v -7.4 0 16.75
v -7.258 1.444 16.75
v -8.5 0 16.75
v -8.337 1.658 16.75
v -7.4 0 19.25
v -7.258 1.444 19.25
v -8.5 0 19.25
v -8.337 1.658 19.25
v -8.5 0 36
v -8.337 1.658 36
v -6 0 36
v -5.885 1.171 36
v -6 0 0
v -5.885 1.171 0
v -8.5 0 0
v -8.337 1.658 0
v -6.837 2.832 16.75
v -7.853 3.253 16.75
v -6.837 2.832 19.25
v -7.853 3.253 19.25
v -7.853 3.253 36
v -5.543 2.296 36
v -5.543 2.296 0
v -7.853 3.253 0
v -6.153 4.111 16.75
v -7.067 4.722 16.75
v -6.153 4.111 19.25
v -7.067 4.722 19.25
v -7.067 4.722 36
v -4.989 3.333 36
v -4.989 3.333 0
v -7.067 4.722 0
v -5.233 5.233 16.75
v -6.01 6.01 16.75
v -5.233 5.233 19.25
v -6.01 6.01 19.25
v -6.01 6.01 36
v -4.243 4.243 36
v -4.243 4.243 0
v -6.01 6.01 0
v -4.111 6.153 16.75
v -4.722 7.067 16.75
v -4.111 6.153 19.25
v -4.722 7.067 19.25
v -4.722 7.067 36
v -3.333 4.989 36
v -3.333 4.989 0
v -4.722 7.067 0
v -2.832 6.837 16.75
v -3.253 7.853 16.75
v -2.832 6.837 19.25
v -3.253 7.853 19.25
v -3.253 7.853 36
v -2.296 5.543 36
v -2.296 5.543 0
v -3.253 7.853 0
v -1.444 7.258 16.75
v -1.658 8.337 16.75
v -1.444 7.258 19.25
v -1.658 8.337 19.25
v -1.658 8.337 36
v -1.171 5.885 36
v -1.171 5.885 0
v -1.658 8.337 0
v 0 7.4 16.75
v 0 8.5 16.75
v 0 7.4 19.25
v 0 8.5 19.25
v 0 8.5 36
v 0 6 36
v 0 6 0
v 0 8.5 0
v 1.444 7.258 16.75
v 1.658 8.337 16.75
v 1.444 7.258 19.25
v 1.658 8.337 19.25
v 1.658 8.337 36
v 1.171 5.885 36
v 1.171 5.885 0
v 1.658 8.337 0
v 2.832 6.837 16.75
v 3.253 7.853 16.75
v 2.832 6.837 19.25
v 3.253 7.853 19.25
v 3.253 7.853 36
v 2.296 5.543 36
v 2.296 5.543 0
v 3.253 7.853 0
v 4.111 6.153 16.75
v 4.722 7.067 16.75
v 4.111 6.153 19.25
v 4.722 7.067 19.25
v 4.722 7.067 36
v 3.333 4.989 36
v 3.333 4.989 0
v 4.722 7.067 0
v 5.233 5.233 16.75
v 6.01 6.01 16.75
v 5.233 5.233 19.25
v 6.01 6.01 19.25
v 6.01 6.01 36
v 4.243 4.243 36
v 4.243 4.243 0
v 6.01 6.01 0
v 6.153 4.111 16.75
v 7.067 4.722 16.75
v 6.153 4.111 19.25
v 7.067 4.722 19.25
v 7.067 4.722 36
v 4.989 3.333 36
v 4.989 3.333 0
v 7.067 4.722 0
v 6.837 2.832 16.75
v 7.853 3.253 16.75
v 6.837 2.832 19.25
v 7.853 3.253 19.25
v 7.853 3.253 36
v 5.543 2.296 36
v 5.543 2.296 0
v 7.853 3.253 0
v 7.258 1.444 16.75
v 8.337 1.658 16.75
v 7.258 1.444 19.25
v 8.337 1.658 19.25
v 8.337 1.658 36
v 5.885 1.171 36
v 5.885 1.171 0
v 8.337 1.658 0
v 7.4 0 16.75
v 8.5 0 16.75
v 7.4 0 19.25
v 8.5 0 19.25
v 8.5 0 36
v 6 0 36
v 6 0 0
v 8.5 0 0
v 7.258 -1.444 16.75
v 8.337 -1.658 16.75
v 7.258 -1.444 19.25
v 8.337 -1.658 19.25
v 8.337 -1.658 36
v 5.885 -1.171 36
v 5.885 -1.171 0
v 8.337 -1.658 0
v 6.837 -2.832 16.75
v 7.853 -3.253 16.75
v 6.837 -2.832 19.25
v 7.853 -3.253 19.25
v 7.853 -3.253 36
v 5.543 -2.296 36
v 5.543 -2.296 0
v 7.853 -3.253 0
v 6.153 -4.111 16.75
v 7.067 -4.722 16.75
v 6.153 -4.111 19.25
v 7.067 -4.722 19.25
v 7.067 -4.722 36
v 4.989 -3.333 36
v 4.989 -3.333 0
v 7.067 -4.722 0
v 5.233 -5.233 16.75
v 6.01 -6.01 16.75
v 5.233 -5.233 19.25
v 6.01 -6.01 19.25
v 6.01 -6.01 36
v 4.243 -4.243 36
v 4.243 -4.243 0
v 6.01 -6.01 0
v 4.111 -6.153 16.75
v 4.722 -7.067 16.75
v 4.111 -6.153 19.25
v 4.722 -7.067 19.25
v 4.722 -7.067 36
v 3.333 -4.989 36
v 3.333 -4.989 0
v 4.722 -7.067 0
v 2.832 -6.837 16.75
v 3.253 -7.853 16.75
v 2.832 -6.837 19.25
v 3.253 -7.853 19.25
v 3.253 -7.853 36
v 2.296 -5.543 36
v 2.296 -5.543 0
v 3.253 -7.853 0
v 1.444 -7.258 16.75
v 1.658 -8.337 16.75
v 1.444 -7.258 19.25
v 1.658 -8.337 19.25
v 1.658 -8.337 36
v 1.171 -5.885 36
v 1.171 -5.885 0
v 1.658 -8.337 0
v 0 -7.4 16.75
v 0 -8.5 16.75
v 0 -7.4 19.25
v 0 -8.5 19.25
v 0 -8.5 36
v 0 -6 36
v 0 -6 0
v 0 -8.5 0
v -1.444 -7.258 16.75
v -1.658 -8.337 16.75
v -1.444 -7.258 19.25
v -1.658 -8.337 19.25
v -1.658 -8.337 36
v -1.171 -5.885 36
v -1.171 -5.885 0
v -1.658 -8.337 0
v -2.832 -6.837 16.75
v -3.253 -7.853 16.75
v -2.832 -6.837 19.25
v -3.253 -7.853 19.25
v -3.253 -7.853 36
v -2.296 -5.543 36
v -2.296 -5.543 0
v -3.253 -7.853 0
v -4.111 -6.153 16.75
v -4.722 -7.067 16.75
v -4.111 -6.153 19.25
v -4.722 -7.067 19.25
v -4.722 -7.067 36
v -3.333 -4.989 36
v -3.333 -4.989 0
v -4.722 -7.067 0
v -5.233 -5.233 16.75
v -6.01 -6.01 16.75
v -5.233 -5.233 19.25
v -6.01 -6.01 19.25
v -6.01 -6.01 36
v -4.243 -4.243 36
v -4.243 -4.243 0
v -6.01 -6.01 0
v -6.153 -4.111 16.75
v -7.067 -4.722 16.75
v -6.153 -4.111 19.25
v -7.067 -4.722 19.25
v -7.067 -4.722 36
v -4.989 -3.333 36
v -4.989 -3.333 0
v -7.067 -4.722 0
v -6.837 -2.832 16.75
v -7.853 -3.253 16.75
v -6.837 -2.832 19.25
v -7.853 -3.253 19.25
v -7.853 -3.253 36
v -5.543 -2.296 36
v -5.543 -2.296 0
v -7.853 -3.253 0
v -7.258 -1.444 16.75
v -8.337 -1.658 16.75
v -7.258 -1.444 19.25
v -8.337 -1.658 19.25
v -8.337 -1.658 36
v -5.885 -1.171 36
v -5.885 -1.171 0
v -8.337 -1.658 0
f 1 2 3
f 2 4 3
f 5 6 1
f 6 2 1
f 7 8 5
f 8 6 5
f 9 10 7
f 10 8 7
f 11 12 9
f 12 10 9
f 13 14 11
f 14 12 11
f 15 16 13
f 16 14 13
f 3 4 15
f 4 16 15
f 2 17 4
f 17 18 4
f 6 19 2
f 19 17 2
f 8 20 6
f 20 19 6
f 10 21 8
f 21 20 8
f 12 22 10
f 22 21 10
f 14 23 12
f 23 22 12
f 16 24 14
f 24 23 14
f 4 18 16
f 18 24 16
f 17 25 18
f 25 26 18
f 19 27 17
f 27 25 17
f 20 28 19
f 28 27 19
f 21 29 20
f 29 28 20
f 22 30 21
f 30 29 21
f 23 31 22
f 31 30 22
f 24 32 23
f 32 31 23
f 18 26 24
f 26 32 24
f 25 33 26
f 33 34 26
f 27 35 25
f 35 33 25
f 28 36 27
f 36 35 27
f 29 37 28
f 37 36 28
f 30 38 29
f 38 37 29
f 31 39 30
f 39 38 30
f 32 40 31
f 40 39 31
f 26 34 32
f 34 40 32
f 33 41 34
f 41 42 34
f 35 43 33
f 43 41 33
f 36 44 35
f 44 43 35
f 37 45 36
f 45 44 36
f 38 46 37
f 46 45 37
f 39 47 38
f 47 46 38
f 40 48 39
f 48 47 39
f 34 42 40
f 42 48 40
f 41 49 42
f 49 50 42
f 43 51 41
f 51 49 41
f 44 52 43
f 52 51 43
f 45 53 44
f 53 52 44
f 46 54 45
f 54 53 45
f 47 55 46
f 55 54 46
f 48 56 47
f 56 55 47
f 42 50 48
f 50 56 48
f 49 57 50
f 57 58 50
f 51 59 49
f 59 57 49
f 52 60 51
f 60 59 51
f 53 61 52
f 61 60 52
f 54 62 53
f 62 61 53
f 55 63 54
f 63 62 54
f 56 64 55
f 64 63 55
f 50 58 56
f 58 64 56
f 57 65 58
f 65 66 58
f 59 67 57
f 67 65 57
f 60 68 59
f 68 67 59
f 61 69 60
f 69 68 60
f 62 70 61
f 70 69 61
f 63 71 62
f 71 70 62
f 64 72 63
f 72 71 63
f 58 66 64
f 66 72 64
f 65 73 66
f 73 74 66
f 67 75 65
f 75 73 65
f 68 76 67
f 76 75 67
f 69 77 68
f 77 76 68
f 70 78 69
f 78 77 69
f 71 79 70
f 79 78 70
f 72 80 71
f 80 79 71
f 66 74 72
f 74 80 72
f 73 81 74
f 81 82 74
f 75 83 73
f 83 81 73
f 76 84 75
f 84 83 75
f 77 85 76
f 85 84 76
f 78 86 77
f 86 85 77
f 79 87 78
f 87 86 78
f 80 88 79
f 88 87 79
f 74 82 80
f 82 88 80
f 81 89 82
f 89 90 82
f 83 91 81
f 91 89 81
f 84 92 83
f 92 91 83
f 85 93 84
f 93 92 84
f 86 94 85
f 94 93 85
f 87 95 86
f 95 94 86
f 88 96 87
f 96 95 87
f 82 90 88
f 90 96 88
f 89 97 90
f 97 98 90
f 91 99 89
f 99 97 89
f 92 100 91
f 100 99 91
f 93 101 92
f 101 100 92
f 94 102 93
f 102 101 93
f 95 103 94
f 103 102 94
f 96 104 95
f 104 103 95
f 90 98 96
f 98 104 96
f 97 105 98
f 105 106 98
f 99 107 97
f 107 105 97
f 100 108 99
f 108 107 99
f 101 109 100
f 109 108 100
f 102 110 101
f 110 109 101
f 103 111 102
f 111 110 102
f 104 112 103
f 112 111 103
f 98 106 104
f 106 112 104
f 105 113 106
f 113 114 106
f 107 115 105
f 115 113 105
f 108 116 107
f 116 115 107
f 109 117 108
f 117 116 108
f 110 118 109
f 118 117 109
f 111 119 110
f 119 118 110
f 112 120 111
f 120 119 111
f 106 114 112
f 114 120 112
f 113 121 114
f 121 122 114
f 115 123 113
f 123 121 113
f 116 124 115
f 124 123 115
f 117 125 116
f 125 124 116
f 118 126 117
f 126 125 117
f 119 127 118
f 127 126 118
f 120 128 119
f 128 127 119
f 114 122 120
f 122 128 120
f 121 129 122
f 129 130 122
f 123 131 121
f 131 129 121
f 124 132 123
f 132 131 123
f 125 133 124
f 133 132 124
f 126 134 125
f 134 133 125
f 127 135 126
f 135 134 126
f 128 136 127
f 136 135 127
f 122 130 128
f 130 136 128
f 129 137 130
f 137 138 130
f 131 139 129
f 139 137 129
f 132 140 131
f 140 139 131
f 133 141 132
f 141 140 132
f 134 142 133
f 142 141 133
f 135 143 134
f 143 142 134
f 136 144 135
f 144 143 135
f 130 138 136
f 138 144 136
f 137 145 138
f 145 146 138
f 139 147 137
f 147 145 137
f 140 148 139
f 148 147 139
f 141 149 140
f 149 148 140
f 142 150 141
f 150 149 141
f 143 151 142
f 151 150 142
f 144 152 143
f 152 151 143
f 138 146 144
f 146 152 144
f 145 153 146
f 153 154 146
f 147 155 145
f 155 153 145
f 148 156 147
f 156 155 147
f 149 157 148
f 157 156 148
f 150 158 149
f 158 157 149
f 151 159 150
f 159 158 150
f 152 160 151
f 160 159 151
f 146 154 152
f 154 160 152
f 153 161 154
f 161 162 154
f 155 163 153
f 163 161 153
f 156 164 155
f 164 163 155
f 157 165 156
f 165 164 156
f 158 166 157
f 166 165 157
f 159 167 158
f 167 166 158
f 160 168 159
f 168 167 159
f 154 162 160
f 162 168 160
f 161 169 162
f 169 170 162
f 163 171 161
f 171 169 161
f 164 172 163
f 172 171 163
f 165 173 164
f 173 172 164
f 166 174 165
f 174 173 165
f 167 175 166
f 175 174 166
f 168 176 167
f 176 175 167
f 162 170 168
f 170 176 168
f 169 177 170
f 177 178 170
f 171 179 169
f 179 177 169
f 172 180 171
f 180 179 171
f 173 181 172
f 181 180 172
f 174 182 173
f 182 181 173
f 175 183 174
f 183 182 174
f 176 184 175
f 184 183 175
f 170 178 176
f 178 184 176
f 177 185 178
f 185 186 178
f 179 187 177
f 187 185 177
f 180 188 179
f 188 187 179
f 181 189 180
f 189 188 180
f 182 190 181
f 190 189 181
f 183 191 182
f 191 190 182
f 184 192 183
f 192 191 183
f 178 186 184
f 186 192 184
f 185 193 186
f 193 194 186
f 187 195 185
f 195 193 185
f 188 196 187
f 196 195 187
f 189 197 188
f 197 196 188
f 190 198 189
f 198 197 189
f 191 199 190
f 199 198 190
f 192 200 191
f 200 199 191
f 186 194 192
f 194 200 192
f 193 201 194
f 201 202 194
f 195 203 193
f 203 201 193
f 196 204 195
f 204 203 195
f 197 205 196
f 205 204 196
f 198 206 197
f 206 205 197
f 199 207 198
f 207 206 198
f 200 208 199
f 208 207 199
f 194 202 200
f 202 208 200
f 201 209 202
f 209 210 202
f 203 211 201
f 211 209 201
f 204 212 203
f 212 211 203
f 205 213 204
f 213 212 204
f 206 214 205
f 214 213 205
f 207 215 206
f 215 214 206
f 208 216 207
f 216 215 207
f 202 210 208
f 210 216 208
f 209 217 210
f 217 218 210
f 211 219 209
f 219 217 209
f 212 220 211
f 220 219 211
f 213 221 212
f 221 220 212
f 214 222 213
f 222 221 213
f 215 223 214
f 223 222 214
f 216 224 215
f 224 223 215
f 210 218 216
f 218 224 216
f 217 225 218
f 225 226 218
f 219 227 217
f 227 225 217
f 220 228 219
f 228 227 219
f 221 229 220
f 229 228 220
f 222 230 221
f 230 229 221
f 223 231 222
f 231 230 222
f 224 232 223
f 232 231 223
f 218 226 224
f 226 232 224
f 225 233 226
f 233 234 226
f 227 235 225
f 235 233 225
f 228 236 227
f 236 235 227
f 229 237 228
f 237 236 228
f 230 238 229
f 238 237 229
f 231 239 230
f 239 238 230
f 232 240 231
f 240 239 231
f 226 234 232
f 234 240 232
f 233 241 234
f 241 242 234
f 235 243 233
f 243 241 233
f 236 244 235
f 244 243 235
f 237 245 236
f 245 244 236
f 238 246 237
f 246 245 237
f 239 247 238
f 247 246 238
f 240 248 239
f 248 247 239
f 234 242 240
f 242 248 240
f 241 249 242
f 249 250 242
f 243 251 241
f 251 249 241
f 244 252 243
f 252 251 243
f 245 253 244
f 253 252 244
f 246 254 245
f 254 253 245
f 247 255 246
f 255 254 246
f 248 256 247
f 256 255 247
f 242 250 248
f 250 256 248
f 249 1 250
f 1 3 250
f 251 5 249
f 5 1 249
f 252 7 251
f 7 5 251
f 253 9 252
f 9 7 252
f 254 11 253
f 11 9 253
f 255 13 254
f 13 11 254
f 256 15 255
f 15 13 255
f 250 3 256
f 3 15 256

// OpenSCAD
$fn = 32;

// ----------------------------------------------------------------------
// Grooved revolve: stepped, bore R6
// ----------------------------------------------------------------------

// --- parameters (mm) ---
bore_r = 6;               // bore radius
outer_r = 8.5;            // outer radius of the body
total_h = 36;             // overall height, Z
wall = 2.5;               // radial wall thickness
groove_w = 2.5;           // groove width
groove_d = 1.1;           // groove depth
grooves = 1;              // number of outer grooves

bbox_x = 2 * outer_r;  // full diameter
bore_d = 2 * bore_r;  // bore diameter
body_d = 2 * outer_r;  // body diameter
revolve_angle = 360;  // full turn around the Z axis

profile = [[6, 0], [8.5, 0], [8.5, 16.75], [7.4, 16.75], [7.4, 19.25], [8.5, 19.25], [8.5, 36], [6, 36]];  // primary outline, 8 points, counter clockwise

// --- the one profile operation ---
rotate_extrude(angle = revolve_angle) polygon(points = profile);
